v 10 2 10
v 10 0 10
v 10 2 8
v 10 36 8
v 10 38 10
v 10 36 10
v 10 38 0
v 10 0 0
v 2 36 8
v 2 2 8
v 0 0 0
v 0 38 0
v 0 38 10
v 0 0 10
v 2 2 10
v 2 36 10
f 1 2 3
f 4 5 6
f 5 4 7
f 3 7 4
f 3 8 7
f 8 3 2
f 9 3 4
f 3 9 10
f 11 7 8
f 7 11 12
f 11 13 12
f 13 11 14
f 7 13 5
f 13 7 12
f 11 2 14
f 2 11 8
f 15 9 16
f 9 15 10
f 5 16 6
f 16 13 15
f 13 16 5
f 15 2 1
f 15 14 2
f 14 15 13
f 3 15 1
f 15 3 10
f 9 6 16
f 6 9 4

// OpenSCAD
jig_width = 10;
hinge_length = 34;
frame_lip = 4;
jig_thickness = 8;
raised_edge_height = 2;

total_length = hinge_length + frame_lip;

union() {
  cube([jig_width, total_length, jig_thickness]);
  cube([2, total_length, jig_thickness + raised_edge_height]);
  cube([jig_width, 2, jig_thickness + raised_edge_height]);
  translate([0, total_length - 2, 0])
    cube([jig_width, 2, jig_thickness + raised_edge_height]);
}
